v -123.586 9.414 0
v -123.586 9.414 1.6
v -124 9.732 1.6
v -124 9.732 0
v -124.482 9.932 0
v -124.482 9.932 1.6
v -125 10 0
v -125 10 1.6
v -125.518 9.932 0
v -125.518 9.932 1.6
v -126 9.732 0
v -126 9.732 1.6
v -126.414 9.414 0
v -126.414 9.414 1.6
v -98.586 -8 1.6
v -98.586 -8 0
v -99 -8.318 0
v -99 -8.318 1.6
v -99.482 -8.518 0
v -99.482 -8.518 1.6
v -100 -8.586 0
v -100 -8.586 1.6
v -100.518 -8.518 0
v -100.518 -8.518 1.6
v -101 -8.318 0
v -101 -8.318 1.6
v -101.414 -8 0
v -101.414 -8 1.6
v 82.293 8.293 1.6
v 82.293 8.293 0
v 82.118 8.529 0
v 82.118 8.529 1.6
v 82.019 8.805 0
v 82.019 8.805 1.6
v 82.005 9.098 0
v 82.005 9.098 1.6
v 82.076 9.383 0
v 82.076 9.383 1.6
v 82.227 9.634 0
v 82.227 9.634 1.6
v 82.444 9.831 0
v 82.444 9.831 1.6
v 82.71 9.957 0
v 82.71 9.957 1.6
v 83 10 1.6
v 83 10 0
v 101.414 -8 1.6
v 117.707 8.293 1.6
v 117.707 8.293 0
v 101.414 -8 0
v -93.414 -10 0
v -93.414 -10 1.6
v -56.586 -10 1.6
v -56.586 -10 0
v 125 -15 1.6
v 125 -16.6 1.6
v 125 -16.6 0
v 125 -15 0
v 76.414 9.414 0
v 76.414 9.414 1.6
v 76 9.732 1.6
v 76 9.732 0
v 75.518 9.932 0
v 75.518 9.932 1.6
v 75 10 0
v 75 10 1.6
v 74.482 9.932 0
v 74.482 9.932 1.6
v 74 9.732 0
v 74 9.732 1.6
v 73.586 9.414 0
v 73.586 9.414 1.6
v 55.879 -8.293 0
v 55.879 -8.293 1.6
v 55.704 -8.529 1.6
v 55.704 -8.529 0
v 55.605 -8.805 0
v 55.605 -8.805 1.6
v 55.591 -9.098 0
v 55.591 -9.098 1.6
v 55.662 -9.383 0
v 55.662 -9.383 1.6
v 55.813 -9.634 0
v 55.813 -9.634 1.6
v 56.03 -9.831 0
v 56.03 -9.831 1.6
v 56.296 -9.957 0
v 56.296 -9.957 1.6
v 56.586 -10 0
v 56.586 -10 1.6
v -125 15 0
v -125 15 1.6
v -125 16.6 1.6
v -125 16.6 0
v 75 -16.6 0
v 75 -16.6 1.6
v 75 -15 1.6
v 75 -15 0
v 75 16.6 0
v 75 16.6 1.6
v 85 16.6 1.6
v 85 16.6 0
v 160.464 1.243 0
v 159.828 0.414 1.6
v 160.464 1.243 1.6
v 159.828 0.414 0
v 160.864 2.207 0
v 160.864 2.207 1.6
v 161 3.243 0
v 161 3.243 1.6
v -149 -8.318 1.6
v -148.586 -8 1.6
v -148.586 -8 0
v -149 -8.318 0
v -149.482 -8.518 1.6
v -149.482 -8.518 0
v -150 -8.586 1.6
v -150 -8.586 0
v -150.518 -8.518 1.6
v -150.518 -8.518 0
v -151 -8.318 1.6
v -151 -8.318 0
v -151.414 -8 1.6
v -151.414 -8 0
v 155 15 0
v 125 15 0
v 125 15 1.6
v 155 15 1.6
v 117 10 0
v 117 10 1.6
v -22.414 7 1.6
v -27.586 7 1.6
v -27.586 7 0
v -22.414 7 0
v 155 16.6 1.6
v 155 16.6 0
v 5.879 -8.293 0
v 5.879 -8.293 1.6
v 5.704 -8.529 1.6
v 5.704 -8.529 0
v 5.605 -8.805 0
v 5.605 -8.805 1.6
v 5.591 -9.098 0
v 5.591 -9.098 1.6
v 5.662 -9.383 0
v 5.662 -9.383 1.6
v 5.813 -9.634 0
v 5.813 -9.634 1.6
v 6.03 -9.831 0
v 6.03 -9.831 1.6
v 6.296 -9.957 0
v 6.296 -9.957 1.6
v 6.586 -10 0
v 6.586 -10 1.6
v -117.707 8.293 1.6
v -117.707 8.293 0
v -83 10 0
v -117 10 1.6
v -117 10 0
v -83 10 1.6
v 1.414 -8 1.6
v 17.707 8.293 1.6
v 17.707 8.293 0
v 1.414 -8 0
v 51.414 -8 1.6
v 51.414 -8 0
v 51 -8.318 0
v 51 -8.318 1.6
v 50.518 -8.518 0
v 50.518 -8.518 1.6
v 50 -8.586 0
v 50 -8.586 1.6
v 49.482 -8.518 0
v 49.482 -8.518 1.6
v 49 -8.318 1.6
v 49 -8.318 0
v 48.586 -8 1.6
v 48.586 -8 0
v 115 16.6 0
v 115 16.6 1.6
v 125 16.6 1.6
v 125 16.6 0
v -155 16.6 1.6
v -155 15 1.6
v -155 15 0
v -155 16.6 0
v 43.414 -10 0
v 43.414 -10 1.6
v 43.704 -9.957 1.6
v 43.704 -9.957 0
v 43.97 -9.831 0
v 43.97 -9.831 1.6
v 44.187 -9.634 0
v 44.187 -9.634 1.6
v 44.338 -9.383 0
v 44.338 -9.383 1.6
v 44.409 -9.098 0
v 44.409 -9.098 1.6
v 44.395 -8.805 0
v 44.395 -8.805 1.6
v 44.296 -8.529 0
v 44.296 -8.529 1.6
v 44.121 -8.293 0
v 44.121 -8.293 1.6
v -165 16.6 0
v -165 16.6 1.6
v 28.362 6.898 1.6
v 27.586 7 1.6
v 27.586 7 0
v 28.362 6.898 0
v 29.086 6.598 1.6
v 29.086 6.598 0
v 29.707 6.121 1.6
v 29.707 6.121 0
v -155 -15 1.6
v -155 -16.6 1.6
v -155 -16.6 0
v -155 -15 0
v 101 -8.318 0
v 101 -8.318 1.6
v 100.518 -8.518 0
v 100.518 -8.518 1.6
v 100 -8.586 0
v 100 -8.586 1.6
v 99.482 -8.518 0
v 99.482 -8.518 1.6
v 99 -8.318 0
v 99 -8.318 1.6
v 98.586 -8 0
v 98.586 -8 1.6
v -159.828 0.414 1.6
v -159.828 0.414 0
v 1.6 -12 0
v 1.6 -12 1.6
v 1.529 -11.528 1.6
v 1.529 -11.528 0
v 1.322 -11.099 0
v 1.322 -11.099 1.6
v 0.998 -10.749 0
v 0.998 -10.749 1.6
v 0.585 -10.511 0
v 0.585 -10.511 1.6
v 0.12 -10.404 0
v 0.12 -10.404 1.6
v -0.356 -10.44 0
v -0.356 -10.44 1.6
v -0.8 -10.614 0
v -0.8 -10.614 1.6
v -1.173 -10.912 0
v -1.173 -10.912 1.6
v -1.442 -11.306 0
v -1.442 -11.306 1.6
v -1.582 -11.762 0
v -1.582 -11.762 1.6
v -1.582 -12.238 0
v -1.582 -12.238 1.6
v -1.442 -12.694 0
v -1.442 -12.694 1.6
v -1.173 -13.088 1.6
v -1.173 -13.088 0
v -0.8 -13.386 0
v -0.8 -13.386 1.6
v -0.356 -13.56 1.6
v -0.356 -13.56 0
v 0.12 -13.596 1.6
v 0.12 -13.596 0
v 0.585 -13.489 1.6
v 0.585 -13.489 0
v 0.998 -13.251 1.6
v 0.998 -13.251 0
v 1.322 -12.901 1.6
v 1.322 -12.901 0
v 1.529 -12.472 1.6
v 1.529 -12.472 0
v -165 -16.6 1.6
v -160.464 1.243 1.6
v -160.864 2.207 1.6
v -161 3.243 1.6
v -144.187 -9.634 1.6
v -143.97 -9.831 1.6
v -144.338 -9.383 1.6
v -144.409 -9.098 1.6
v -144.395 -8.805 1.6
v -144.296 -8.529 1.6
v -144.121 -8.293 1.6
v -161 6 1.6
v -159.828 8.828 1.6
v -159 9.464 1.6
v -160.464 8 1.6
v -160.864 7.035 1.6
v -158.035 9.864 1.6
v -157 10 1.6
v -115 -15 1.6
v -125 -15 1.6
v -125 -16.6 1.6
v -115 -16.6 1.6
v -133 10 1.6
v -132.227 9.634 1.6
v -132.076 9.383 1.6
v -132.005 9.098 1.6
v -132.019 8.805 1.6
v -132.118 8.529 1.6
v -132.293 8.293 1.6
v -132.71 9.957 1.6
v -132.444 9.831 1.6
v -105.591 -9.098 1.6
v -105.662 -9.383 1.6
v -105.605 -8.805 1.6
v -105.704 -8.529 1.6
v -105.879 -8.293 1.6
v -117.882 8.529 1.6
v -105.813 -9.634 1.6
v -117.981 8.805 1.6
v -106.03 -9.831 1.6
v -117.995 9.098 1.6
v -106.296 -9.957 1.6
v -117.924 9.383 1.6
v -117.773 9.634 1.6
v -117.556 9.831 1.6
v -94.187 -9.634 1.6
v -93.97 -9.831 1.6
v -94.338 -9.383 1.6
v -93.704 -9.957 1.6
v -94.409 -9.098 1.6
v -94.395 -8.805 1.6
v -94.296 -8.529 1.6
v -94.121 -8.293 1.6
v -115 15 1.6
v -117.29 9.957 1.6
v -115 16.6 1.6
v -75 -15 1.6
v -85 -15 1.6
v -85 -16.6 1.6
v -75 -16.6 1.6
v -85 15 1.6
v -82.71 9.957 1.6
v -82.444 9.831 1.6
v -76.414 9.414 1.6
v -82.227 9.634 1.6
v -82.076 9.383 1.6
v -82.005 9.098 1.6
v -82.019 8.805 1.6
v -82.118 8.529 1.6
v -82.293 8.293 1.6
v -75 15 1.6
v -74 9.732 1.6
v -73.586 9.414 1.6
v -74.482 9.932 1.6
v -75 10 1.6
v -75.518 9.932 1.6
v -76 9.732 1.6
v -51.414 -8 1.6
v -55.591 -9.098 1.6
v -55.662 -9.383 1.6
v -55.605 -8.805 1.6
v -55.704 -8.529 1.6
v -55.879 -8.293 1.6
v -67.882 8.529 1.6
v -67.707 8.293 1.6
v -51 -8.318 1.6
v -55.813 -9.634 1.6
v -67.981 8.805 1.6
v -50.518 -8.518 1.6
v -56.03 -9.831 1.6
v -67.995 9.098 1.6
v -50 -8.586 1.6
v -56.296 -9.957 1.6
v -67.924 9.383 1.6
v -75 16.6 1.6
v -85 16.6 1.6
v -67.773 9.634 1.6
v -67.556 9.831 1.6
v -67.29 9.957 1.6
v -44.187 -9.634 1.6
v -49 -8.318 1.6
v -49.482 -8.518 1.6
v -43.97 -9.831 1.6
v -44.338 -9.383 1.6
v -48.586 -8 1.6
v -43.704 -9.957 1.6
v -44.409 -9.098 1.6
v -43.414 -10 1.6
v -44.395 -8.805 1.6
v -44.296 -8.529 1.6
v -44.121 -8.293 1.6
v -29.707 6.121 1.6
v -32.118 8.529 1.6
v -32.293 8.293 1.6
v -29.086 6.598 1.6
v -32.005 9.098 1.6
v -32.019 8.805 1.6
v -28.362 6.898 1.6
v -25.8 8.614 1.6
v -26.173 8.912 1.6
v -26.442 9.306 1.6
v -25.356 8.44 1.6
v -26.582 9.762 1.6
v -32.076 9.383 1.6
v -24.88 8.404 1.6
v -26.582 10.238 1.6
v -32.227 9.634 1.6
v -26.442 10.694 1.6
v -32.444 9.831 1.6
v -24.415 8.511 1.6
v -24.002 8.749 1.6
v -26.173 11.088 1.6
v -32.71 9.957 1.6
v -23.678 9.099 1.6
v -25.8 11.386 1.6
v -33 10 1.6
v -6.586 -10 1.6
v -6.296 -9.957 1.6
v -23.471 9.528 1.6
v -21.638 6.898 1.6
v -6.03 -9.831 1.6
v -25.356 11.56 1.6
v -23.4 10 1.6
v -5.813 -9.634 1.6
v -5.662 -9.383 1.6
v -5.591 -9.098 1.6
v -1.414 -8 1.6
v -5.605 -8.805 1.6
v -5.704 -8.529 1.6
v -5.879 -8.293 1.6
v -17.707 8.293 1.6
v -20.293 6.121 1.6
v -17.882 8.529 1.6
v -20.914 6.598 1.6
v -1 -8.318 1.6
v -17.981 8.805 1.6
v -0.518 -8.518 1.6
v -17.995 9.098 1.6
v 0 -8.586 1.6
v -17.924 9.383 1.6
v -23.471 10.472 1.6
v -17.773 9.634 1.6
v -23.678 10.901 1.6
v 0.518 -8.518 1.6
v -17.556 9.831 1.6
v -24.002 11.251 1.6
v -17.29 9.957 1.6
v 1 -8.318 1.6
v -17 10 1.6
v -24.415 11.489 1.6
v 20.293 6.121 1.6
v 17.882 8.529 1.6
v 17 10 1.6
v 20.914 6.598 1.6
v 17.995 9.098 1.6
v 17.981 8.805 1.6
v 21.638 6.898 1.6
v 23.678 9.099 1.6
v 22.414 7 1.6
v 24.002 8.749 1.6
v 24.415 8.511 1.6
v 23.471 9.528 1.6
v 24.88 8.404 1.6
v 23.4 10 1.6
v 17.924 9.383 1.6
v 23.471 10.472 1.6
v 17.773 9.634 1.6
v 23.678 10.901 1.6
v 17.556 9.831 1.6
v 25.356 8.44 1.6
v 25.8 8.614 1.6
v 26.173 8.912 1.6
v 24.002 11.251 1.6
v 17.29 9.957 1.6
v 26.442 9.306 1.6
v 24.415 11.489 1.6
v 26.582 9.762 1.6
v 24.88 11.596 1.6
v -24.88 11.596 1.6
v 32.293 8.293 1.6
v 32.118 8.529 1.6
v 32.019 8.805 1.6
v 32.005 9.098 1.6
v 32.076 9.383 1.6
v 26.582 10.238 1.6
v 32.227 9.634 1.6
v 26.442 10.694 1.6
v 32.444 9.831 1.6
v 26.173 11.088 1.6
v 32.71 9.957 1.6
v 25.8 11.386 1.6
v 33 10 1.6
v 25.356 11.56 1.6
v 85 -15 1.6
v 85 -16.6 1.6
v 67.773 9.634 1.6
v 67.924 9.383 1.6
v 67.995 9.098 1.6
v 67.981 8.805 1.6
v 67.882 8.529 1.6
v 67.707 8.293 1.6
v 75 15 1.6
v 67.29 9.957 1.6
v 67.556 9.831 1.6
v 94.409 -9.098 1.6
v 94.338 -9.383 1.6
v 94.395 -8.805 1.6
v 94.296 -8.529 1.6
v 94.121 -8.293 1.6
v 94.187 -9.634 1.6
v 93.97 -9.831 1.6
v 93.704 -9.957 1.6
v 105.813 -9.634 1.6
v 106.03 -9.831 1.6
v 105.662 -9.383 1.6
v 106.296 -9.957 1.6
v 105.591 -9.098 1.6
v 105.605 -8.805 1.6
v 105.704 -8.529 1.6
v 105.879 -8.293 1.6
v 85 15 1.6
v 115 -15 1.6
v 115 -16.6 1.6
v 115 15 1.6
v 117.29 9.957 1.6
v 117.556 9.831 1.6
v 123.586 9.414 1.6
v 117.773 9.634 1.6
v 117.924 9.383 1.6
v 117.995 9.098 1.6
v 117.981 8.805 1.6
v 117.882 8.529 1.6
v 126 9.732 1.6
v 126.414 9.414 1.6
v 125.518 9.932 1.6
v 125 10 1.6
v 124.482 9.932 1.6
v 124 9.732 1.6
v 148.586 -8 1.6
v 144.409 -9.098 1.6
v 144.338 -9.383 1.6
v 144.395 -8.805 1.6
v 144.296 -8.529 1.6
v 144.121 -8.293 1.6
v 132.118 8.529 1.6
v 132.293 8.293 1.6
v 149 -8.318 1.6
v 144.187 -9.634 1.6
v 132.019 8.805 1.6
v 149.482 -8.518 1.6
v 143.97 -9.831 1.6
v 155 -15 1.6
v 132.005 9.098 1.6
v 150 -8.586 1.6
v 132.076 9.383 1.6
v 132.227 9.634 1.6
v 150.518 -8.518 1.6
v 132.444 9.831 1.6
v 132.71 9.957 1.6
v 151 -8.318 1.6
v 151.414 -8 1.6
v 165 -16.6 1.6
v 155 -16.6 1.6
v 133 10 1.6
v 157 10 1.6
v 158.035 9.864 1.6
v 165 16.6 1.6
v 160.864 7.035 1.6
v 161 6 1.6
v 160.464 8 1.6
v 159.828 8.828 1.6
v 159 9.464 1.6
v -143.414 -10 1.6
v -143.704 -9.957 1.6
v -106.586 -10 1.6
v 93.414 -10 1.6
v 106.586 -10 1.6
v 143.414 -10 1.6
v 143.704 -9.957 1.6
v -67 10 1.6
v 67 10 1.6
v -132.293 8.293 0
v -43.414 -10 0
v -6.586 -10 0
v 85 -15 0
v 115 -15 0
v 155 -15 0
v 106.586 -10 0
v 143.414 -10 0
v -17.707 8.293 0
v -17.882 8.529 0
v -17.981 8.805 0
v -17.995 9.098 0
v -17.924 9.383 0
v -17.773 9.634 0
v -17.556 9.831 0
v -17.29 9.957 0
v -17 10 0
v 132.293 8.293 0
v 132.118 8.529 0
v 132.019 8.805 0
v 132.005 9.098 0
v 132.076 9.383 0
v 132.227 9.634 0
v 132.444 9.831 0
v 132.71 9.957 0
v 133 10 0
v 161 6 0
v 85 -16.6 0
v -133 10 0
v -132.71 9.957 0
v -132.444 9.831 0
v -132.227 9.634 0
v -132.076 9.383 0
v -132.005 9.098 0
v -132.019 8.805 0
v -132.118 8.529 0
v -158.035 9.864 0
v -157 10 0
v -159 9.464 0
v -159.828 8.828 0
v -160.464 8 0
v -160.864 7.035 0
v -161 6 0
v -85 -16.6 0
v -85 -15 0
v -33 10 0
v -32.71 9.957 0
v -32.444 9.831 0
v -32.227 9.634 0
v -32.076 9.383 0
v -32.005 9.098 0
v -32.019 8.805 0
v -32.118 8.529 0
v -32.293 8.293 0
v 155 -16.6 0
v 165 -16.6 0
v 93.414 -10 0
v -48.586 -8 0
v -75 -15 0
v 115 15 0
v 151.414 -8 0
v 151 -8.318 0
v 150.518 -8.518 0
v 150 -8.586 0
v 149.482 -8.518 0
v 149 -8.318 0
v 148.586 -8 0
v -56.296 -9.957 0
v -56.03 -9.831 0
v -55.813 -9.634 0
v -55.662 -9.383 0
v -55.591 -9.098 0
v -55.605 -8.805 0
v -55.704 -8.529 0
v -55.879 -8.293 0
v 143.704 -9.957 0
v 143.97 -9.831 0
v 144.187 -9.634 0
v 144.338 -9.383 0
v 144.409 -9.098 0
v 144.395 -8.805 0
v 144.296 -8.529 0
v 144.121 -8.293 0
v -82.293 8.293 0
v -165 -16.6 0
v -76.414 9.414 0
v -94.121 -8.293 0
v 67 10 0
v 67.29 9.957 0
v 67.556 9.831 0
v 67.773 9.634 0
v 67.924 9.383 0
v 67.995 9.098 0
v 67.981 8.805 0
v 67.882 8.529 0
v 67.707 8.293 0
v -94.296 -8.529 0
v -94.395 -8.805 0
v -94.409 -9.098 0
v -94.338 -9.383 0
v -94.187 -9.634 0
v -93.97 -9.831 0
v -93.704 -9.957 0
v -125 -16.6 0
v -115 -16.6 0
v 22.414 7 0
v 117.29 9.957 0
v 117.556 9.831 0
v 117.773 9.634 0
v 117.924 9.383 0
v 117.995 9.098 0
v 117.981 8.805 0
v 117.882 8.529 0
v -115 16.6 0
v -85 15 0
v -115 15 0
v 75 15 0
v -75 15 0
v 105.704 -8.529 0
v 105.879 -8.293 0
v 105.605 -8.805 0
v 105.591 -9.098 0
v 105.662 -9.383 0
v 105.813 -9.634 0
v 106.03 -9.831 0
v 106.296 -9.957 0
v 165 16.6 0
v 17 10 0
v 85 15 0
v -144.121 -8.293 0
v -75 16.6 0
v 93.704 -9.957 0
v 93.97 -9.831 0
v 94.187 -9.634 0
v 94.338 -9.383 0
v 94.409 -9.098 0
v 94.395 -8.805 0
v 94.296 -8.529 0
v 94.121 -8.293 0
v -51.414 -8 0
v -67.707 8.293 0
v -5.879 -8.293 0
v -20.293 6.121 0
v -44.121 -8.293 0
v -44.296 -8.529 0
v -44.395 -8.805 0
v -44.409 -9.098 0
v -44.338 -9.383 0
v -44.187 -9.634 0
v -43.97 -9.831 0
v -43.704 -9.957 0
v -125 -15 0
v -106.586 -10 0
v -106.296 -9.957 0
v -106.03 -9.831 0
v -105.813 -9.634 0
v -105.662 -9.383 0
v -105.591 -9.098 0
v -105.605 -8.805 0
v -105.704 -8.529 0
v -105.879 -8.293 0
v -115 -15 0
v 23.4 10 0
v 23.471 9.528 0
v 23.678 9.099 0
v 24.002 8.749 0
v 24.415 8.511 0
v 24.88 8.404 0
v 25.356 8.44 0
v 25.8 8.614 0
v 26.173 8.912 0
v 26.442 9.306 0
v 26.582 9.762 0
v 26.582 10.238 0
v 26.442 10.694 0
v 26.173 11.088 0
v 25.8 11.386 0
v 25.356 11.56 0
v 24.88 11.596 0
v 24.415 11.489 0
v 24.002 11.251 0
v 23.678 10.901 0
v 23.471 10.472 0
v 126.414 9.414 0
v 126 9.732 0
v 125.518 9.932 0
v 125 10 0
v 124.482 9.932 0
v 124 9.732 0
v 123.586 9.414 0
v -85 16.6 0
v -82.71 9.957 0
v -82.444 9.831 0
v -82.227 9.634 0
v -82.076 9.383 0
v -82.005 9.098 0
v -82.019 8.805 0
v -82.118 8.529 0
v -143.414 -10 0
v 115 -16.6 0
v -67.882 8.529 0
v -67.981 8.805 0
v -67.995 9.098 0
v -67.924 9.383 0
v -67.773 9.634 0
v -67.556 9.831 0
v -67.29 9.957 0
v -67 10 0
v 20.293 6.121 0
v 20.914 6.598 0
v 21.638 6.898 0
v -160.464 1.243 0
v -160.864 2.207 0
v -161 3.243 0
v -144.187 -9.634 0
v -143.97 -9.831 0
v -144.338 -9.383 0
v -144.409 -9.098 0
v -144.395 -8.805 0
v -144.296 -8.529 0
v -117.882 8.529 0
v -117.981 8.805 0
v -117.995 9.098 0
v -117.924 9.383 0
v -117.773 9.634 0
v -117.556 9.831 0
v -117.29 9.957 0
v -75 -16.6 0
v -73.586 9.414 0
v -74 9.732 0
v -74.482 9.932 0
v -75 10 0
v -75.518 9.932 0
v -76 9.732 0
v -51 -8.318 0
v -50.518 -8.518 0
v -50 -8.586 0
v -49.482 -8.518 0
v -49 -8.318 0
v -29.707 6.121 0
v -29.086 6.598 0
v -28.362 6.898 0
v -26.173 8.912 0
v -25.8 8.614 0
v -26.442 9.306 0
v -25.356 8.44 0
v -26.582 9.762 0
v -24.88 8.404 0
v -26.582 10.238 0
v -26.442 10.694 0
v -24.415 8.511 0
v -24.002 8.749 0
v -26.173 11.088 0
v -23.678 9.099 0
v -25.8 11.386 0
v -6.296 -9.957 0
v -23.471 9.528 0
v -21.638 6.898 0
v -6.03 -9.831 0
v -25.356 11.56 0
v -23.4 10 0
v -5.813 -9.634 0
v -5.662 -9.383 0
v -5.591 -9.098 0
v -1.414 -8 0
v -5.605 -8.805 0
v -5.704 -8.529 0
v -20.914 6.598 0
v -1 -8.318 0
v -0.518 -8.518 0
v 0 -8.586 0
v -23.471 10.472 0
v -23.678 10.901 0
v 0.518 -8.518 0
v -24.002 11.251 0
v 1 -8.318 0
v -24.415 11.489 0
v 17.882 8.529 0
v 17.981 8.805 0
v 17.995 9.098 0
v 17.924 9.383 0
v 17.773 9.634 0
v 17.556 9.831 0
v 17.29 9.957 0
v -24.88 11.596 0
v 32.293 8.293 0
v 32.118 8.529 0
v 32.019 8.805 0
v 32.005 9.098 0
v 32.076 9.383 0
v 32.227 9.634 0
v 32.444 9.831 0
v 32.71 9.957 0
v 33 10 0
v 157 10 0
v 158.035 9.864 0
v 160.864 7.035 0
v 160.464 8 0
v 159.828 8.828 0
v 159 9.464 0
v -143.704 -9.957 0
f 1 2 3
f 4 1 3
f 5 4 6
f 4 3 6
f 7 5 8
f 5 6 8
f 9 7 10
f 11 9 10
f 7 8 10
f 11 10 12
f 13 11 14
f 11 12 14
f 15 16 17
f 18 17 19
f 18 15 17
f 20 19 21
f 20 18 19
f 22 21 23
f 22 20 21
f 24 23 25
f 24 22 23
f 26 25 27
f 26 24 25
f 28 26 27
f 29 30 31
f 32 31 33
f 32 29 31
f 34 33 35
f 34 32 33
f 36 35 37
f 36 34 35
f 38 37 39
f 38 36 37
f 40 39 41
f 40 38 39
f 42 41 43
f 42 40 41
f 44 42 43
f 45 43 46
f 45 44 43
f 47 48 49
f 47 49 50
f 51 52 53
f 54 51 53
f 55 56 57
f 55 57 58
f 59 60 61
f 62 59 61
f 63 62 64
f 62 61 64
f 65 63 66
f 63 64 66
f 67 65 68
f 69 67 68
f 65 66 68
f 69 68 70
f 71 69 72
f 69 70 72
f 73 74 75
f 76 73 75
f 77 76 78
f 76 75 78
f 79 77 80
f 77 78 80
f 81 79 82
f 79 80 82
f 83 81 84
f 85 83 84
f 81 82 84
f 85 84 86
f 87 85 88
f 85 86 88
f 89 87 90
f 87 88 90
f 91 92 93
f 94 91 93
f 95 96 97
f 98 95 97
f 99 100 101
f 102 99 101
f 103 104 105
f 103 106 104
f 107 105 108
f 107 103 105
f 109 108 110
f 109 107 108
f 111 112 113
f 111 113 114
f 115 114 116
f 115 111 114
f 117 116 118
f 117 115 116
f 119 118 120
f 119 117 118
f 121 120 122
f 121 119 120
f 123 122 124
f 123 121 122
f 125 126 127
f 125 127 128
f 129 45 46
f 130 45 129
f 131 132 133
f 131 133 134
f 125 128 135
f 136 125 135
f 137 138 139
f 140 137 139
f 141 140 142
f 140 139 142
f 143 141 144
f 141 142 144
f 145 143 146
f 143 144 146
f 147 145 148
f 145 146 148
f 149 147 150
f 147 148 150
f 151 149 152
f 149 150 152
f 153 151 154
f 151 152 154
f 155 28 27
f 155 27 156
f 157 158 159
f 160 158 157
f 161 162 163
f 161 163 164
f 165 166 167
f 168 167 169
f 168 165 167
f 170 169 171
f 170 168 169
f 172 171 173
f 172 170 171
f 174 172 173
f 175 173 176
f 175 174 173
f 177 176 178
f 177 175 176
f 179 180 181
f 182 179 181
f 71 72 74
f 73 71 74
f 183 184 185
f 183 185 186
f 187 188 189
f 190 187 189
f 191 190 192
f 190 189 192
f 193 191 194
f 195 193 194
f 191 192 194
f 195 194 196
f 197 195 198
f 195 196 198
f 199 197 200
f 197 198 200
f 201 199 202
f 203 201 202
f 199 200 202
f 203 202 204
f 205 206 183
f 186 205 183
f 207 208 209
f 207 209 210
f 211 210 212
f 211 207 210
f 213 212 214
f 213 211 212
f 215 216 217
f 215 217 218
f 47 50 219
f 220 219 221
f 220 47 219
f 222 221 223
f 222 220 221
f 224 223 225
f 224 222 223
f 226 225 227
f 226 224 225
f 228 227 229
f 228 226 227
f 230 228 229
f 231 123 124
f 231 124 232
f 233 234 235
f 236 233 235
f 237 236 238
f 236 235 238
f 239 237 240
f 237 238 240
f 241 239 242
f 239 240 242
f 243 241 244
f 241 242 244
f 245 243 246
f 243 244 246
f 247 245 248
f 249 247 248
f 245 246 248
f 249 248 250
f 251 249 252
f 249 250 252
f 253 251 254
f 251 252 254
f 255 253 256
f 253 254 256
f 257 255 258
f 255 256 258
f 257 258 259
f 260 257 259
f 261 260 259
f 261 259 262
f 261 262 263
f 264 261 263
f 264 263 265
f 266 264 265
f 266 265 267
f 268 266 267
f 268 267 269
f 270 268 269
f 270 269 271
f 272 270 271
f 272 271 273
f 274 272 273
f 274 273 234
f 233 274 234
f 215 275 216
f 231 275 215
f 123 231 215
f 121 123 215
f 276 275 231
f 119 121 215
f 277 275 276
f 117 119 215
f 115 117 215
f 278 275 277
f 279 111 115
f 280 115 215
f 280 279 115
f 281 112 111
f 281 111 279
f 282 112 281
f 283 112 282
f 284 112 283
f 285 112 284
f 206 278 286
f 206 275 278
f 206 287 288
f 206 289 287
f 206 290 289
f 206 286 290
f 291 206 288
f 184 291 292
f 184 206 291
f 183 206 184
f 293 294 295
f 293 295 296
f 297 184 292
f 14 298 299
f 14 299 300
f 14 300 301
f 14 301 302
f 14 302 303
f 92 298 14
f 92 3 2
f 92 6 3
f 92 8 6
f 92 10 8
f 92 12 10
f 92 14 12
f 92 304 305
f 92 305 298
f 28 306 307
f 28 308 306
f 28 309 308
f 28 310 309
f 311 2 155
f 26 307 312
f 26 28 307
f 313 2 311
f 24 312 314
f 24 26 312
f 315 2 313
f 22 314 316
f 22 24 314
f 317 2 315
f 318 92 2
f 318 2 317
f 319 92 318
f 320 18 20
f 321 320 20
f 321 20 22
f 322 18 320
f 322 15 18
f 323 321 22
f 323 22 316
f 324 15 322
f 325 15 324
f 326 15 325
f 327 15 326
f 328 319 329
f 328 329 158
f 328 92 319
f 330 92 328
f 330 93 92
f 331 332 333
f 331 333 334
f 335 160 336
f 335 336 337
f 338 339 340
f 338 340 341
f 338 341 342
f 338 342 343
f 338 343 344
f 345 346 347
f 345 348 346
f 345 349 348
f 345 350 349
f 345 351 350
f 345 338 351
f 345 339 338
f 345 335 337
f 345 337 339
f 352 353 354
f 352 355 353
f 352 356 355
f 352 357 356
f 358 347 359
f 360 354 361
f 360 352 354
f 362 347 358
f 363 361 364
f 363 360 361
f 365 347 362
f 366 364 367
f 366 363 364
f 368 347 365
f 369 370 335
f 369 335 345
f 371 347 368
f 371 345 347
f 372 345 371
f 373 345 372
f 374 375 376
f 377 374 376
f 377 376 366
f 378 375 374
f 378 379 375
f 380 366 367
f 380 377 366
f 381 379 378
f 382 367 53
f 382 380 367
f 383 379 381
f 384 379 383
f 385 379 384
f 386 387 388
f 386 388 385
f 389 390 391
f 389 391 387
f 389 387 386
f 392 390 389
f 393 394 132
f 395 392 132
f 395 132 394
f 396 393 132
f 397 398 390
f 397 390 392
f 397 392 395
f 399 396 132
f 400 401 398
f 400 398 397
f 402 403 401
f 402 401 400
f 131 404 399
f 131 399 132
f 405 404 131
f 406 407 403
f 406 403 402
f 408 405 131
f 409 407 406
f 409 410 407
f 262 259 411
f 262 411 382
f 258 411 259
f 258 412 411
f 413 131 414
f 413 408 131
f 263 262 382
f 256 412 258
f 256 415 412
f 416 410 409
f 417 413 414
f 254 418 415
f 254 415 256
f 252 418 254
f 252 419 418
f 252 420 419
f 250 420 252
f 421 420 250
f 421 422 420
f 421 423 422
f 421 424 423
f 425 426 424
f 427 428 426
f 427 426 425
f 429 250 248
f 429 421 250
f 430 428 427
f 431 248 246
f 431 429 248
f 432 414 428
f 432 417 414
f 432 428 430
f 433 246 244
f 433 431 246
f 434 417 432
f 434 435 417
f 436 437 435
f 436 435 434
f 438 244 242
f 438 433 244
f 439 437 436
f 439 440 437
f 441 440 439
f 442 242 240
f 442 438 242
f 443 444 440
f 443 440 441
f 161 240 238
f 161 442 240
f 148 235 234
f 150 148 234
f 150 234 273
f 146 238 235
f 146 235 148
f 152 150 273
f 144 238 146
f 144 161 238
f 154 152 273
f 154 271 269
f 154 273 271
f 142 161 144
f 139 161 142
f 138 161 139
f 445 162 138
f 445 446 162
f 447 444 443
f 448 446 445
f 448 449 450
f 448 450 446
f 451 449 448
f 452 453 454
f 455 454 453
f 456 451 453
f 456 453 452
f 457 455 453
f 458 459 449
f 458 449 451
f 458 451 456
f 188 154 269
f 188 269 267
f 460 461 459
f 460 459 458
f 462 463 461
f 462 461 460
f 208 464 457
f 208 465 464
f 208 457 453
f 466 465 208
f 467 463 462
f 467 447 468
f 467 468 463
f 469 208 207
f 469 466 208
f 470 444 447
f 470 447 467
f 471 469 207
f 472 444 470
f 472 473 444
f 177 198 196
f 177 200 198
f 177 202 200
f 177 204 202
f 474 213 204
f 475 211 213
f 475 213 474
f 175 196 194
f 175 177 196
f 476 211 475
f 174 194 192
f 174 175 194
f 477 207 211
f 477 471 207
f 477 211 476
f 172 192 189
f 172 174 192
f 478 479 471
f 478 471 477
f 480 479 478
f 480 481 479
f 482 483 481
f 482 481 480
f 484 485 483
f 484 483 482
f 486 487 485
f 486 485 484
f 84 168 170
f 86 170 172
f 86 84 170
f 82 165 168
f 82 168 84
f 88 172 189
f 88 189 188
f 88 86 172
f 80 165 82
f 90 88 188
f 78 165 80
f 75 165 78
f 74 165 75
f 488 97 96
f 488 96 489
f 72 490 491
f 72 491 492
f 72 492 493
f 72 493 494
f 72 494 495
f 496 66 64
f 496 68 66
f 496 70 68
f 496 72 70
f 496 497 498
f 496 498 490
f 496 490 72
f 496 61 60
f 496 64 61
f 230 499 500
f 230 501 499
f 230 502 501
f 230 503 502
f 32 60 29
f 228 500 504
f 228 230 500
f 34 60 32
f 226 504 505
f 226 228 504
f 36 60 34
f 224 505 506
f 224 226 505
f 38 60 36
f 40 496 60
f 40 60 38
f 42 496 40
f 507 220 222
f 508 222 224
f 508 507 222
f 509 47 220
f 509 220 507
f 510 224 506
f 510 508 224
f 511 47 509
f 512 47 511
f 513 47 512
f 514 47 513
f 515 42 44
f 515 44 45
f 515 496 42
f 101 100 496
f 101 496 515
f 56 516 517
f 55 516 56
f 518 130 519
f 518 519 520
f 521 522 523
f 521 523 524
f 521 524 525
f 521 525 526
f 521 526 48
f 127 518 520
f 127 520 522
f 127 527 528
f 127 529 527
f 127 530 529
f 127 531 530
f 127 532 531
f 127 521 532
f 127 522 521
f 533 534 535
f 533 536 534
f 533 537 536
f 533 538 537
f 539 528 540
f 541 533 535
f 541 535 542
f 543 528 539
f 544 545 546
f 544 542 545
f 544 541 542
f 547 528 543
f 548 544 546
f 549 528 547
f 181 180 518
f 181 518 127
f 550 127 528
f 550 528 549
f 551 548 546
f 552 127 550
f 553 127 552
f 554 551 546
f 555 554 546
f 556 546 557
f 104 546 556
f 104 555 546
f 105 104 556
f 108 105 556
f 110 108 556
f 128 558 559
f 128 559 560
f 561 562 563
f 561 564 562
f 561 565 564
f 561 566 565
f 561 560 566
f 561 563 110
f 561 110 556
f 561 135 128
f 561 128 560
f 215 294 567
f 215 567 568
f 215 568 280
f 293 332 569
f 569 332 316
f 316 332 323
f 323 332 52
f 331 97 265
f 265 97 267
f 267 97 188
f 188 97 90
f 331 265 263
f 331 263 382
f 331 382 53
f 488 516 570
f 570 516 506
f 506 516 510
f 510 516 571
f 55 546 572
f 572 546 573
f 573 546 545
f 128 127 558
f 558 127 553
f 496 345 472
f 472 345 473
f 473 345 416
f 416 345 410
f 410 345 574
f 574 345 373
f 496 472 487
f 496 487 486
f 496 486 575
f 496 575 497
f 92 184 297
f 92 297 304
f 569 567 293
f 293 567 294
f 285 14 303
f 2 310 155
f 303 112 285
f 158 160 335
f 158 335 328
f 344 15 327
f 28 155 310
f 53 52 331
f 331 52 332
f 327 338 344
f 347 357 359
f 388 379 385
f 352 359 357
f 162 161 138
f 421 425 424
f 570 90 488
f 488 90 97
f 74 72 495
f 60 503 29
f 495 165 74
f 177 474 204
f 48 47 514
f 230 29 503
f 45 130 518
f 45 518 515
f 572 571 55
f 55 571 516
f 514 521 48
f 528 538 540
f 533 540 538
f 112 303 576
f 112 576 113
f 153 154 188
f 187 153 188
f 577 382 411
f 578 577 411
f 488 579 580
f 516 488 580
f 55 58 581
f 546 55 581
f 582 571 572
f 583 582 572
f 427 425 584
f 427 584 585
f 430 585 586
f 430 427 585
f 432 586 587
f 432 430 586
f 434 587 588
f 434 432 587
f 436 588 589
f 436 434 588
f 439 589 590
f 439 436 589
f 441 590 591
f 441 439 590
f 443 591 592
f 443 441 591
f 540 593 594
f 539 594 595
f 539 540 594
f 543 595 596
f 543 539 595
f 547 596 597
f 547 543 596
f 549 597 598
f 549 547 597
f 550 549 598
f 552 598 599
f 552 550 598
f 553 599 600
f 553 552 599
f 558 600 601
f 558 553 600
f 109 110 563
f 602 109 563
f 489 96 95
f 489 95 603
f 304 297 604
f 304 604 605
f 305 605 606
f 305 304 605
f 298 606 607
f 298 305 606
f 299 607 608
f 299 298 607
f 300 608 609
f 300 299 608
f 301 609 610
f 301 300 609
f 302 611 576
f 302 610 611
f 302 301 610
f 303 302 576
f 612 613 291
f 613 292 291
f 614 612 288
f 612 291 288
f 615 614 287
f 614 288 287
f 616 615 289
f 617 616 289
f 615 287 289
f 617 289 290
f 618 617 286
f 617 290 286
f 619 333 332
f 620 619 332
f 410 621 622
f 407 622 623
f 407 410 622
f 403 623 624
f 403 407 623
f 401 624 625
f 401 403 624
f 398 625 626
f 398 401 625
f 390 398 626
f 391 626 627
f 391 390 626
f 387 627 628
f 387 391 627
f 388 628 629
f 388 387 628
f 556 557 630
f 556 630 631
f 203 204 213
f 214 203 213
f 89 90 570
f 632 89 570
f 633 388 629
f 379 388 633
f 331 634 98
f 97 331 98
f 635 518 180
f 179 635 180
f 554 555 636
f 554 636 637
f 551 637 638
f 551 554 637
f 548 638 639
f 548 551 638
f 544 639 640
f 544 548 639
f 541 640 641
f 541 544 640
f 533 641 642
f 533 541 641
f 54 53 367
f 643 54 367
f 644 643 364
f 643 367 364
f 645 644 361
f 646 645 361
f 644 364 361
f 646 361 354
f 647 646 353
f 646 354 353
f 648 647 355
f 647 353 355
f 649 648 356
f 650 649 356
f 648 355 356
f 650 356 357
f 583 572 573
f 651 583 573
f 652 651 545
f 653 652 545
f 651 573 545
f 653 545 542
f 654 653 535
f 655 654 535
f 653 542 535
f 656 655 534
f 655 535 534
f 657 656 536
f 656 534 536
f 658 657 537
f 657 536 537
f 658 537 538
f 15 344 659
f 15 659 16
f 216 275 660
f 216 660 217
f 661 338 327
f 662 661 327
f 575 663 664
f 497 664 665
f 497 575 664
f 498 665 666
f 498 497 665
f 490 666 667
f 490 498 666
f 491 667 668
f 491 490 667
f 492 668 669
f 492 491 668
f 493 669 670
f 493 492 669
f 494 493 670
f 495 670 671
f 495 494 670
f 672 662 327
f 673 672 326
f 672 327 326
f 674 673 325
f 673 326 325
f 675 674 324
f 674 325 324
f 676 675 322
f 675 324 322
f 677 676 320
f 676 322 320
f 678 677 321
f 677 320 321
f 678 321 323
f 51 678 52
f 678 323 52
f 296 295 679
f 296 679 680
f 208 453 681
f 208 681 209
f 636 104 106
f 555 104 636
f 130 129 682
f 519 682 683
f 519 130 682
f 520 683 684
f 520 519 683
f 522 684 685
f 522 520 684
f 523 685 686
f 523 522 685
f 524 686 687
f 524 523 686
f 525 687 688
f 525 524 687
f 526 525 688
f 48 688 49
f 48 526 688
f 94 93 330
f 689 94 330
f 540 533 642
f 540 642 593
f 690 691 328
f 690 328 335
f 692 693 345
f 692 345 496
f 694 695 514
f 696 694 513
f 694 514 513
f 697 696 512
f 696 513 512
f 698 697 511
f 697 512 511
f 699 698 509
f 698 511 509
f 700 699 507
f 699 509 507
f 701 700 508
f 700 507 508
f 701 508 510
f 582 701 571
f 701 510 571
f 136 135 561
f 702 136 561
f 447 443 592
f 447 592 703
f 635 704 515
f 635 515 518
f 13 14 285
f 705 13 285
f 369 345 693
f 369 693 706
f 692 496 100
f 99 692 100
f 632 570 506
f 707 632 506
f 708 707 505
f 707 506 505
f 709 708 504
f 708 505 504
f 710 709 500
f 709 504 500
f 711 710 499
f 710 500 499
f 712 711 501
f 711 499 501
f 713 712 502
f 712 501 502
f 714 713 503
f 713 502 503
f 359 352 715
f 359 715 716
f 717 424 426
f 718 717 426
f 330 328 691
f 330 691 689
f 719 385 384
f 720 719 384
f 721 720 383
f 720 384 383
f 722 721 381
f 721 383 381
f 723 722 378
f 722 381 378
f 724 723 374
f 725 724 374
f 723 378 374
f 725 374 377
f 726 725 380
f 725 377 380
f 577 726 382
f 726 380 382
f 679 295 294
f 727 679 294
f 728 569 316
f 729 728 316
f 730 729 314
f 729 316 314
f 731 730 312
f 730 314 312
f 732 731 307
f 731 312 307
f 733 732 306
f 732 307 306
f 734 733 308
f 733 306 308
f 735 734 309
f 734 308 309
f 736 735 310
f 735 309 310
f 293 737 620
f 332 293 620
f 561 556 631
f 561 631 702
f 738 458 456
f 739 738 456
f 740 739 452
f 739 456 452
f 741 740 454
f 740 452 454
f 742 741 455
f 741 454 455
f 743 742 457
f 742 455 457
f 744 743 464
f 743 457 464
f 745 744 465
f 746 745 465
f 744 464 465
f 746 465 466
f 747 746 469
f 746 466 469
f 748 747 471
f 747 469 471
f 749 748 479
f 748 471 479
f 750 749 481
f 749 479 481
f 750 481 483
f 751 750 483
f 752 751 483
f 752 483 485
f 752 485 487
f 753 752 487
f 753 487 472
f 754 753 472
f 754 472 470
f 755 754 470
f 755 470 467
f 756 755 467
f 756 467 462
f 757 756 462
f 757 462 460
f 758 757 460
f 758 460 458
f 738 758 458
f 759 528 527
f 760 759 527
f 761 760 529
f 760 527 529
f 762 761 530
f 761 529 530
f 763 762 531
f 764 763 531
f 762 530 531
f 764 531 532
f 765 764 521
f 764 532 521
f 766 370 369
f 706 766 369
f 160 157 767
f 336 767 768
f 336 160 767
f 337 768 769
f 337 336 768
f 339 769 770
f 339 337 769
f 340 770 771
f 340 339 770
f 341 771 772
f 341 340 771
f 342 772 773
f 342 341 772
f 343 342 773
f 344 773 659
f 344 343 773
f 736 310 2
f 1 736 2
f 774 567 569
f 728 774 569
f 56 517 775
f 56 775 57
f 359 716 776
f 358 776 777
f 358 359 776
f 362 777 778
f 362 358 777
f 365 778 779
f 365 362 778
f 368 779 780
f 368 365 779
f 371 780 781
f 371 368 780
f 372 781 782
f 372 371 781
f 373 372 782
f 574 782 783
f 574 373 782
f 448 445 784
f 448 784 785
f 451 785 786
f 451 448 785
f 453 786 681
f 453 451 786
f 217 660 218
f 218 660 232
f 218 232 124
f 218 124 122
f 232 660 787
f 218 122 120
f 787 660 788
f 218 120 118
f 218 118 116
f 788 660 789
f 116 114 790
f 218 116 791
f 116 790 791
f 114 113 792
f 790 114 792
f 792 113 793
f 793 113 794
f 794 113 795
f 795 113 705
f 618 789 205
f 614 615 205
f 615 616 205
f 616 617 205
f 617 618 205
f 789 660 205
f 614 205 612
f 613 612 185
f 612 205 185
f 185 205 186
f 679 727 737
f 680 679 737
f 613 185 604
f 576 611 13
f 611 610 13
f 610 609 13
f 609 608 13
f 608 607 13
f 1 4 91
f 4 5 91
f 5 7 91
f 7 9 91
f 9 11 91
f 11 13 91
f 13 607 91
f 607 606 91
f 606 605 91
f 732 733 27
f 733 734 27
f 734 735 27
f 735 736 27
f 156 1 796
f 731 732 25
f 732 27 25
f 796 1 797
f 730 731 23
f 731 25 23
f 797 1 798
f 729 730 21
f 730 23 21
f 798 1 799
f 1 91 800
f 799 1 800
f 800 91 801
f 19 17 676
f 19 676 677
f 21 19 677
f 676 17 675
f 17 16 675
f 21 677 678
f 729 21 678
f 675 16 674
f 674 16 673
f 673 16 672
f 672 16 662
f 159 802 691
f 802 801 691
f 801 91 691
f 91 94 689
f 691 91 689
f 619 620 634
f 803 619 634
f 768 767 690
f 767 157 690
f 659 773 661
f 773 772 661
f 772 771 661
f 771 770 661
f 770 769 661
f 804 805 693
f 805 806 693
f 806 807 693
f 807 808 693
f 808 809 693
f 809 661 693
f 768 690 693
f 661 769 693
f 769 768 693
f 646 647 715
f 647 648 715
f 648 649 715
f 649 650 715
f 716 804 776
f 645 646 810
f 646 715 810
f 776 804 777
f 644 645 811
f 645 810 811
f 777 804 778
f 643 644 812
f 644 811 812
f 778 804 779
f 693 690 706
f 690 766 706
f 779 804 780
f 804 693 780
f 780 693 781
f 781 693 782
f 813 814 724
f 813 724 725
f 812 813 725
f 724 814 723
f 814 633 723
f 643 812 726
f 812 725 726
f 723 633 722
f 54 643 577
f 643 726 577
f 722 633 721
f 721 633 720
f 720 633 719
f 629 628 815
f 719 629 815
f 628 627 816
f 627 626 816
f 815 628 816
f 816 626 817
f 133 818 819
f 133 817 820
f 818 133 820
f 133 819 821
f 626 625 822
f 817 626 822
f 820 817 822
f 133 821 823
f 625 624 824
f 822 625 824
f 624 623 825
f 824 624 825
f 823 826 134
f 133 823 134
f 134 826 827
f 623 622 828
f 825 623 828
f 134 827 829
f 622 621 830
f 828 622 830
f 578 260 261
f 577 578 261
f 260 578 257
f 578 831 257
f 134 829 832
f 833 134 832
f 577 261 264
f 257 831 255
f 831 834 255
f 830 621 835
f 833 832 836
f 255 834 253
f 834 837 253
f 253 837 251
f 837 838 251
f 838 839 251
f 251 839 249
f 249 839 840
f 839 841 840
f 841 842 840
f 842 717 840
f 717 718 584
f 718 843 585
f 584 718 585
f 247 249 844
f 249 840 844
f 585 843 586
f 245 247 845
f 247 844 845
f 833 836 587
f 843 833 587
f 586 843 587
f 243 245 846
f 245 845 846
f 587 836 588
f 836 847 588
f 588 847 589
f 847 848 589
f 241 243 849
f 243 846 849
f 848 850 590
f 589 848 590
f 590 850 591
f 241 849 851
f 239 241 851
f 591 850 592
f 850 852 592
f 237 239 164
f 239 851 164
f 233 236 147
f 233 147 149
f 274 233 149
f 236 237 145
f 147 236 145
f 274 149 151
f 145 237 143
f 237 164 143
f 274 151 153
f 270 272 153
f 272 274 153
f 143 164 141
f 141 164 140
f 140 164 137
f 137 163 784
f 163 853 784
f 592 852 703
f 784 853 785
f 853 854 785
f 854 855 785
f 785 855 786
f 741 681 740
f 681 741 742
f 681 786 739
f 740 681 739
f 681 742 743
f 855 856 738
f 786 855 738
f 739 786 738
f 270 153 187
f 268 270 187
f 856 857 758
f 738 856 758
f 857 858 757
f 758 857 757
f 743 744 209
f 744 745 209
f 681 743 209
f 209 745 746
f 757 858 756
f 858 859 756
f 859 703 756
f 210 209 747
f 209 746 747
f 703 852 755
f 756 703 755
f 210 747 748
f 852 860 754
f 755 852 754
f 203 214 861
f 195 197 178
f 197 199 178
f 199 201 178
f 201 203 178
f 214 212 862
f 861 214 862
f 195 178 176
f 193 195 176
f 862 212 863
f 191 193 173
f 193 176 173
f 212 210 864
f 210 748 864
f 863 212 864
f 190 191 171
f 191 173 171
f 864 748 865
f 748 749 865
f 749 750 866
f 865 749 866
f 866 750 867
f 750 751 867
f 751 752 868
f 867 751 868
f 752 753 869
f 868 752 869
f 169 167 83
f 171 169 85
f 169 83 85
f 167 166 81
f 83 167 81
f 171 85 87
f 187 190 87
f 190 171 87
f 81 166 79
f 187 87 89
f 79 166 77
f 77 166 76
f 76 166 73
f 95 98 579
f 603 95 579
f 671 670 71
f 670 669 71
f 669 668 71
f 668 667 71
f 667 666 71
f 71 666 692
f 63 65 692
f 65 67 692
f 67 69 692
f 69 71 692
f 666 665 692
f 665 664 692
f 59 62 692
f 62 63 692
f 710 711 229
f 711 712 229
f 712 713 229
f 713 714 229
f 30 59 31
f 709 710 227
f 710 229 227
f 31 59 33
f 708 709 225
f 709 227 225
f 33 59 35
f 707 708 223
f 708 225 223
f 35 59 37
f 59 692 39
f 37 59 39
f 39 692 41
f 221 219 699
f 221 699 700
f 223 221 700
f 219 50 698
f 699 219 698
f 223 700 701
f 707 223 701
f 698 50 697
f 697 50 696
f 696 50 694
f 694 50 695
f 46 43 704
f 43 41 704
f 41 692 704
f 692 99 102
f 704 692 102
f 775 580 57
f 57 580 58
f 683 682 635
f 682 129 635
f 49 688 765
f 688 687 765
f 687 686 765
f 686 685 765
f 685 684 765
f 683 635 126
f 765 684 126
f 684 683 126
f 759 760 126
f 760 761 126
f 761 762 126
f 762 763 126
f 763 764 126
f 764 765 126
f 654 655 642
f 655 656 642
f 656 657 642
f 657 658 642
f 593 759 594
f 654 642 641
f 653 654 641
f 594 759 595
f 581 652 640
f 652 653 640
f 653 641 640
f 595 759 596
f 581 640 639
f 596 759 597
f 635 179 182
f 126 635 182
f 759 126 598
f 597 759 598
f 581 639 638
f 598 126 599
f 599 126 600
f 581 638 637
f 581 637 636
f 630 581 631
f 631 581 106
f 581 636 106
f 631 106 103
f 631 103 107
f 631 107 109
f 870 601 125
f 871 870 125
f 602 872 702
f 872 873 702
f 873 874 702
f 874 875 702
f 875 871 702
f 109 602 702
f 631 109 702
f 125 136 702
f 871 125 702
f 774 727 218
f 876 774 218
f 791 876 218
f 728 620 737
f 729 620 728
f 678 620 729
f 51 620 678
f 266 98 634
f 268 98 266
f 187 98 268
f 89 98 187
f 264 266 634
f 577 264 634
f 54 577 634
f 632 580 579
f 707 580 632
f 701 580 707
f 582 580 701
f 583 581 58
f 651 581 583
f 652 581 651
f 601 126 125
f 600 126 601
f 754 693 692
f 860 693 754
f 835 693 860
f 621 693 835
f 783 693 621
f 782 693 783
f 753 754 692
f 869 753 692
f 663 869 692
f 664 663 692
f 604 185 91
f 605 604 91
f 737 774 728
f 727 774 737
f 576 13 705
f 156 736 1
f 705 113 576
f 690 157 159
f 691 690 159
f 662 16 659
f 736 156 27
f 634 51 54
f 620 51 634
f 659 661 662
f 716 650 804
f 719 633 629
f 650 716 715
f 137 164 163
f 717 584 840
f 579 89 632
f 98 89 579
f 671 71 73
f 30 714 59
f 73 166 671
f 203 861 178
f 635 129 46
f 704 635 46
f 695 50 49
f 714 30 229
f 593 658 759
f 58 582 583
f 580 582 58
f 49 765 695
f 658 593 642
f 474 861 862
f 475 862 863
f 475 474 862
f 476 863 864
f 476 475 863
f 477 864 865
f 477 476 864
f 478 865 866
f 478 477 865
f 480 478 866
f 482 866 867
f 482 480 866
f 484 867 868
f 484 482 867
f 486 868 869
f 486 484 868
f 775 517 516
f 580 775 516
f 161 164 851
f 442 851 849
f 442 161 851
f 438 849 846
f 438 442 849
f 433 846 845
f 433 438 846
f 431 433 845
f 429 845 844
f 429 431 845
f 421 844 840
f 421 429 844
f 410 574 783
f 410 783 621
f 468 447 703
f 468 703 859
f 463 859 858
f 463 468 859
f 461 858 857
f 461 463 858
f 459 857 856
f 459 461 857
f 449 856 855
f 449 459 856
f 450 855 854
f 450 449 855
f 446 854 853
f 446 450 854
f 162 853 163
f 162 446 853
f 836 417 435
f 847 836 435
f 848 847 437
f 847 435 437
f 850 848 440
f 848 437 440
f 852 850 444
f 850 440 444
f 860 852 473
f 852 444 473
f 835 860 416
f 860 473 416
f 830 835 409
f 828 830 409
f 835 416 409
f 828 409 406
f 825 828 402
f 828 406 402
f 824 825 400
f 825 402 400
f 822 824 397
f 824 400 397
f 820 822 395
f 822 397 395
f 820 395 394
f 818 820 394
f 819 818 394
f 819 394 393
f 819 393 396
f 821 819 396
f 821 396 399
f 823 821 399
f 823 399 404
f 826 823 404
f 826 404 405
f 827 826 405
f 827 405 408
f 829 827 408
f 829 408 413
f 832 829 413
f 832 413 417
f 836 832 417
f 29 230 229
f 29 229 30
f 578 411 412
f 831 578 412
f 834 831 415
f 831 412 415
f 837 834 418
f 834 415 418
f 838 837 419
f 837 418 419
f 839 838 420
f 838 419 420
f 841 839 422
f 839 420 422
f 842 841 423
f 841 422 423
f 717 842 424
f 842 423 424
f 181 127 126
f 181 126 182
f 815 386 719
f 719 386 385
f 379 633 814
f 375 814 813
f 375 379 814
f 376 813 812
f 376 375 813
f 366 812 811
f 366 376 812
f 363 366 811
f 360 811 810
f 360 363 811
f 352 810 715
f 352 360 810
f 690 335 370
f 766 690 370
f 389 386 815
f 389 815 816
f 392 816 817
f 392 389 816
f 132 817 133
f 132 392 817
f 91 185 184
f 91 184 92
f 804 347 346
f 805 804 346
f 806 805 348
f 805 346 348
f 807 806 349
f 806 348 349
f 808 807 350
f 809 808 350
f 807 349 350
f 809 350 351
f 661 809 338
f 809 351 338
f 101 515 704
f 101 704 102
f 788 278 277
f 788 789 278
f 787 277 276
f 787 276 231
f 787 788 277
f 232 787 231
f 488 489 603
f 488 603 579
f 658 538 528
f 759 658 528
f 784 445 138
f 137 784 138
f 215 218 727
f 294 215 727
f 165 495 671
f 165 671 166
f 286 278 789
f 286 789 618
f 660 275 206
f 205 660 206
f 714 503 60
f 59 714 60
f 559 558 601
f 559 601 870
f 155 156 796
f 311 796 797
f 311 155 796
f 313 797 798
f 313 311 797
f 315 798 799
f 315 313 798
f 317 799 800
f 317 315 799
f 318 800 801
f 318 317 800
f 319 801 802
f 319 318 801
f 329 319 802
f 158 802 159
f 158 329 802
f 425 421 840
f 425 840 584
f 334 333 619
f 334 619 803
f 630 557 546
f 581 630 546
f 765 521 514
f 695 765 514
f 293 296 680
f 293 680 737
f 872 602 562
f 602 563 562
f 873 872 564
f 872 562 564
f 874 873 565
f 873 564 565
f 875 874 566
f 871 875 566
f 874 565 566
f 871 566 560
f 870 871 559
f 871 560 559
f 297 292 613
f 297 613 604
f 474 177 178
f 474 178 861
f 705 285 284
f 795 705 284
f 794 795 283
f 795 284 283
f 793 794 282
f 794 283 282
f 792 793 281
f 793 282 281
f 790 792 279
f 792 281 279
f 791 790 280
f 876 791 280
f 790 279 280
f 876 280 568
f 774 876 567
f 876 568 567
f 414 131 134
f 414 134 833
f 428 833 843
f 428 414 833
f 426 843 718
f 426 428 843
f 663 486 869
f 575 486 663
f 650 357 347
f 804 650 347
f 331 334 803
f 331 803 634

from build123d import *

# Parameters (mm, degrees)
SKETCH1_W           = 360
SKETCH1_H           = 30
BOSS_EXTRUDE1_DEPTH = 1.6
SKETCH2_W           = 10
SKETCH2_H           = 1.6
BOSS_EXTRUDE2_DEPTH = 1.6
CUT_EXTRUDE1_DEPTH  = 181.770904739
CUT_EXTRUDE2_DEPTH  = 181.770904739
SKETCH5_W           = 15
SKETCH5_H           = 30
CUT_EXTRUDE3_DEPTH  = 181.770904739
SKETCH6_W           = 4
SKETCH6_H           = 33.2
BOSS_EXTRUDE3_DEPTH = 1.6
FILLET1_R           = 4
BOSS_EXTRUDE4_DEPTH = 1.6
SKETCH8_R           = 1.6
CUT_EXTRUDE4_DEPTH  = 166.840646405


with BuildPart() as part:
    # Sketch1 → Boss-Extrude1 (new body)
    with BuildSketch(Plane.XY):
        Rectangle(SKETCH1_W, SKETCH1_H)
    extrude(amount=BOSS_EXTRUDE1_DEPTH)

    # Sketch2 → Boss-Extrude2 (add)
    with BuildSketch(Plane.XY.offset(1.6)):
        with Locations((120, 15.8)):
            Rectangle(SKETCH2_W, SKETCH2_H)
        with Locations((80, 15.8)):
            Rectangle(SKETCH2_W, SKETCH2_H)
        with Locations((160, 15.8)):
            Rectangle(SKETCH2_W, SKETCH2_H)
        with Locations((-160, 15.8)):
            Rectangle(SKETCH2_W, SKETCH2_H)
        with Locations((-120, 15.8)):
            Rectangle(SKETCH2_W, SKETCH2_H)
        with Locations((-80, 15.8)):
            Rectangle(SKETCH2_W, SKETCH2_H)
        with Locations((-120, -15.8)):
            Rectangle(SKETCH2_W, SKETCH2_H)
        with Locations((-80, -15.8)):
            Rectangle(SKETCH2_W, SKETCH2_H)
        with Locations((-160, -15.8)):
            Rectangle(SKETCH2_W, SKETCH2_H)
        with Locations((160, -15.8)):
            Rectangle(SKETCH2_W, SKETCH2_H)
        with Locations((120, -15.8)):
            Rectangle(SKETCH2_W, SKETCH2_H)
        with Locations((80, -15.8)):
            Rectangle(SKETCH2_W, SKETCH2_H)
    extrude(amount=-BOSS_EXTRUDE2_DEPTH)

    # Sketch3 → Cut-Extrude1 (cut, through all)
    with BuildSketch(Plane.XY.offset(1.6)):
        with BuildLine():
            Line((-167, 10), (-133, 10))
            ThreePointArc((-133, 10), (-132.076120467, 9.382683432), (-132.292893219, 8.292893219))
            Line((-132.292893219, 8.292893219), (-148.585786438, -8))
            ThreePointArc((-148.585786438, -8), (-150, -8.585786438), (-151.414213562, -8))
            Line((-151.414213562, -8), (-167.707106781, 8.292893219))
            ThreePointArc((-167.707106781, 8.292893219), (-167.923879533, 9.382683432), (-167, 10))
        make_face()
        with BuildLine():
            Line((-117, 10), (-83, 10))
            ThreePointArc((-83, 10), (-82.076120467, 9.382683432), (-82.292893219, 8.292893219))
            Line((-82.292893219, 8.292893219), (-98.585786438, -8))
            ThreePointArc((-98.585786438, -8), (-100, -8.585786438), (-101.414213562, -8))
            Line((-101.414213562, -8), (-117.707106781, 8.292893219))
            ThreePointArc((-117.707106781, 8.292893219), (-117.923879533, 9.382683432), (-117, 10))
        make_face()
        with BuildLine():
            Line((-67, 10), (-33, 10))
            ThreePointArc((-33, 10), (-32.076120467, 9.382683432), (-32.292893219, 8.292893219))
            Line((-32.292893219, 8.292893219), (-48.585786438, -8))
            ThreePointArc((-48.585786438, -8), (-50, -8.585786438), (-51.414213562, -8))
            Line((-51.414213562, -8), (-67.707106781, 8.292893219))
            ThreePointArc((-67.707106781, 8.292893219), (-67.923879533, 9.382683432), (-67, 10))
        make_face()
        with BuildLine():
            Line((-17, 10), (17, 10))
            ThreePointArc((17, 10), (17.923879533, 9.382683432), (17.707106781, 8.292893219))
            Line((17.707106781, 8.292893219), (1.414213562, -8))
            ThreePointArc((1.414213562, -8), (0, -8.585786438), (-1.414213562, -8))
            Line((-1.414213562, -8), (-17.707106781, 8.292893219))
            ThreePointArc((-17.707106781, 8.292893219), (-17.923879533, 9.382683432), (-17, 10))
        make_face()
        with BuildLine():
            Line((33, 10), (67, 10))
            ThreePointArc((67, 10), (67.923879533, 9.382683432), (67.707106781, 8.292893219))
            Line((67.707106781, 8.292893219), (51.414213562, -8))
            ThreePointArc((51.414213562, -8), (50, -8.585786438), (48.585786438, -8))
            Line((48.585786438, -8), (32.292893219, 8.292893219))
            ThreePointArc((32.292893219, 8.292893219), (32.076120467, 9.382683432), (33, 10))
        make_face()
        with BuildLine():
            Line((83, 10), (117, 10))
            ThreePointArc((117, 10), (117.923879533, 9.382683432), (117.707106781, 8.292893219))
            Line((117.707106781, 8.292893219), (101.414213562, -8))
            ThreePointArc((101.414213562, -8), (100, -8.585786438), (98.585786438, -8))
            Line((98.585786438, -8), (82.292893219, 8.292893219))
            ThreePointArc((82.292893219, 8.292893219), (82.076120467, 9.382683432), (83, 10))
        make_face()
        with BuildLine():
            Line((133, 10), (167, 10))
            ThreePointArc((167, 10), (167.923879533, 9.382683432), (167.707106781, 8.292893219))
            Line((167.707106781, 8.292893219), (151.414213562, -8))
            ThreePointArc((151.414213562, -8), (150, -8.585786438), (148.585786438, -8))
            Line((148.585786438, -8), (132.292893219, 8.292893219))
            ThreePointArc((132.292893219, 8.292893219), (132.076120467, 9.382683432), (133, 10))
        make_face()
    extrude(amount=-CUT_EXTRUDE1_DEPTH, mode=Mode.SUBTRACT)

    # Sketch4 → Cut-Extrude2 (cut, through all)
    with BuildSketch(Plane.XY.offset(1.6)):
        with BuildLine():
            Line((-143.414213562, -10), (-106.585786438, -10))
            ThreePointArc((-106.585786438, -10), (-105.661906905, -9.382683432), (-105.878679656, -8.292893219))
            Line((-105.878679656, -8.292893219), (-123.585786438, 9.414213562))
            ThreePointArc((-123.585786438, 9.414213562), (-125, 10), (-126.414213562, 9.414213562))
            Line((-126.414213562, 9.414213562), (-144.121320344, -8.292893219))
            ThreePointArc((-144.121320344, -8.292893219), (-144.338093095, -9.382683432), (-143.414213562, -10))
        make_face()
        with BuildLine():
            Line((-93.414213562, -10), (-56.585786438, -10))
            ThreePointArc((-56.585786438, -10), (-55.661906905, -9.382683432), (-55.878679656, -8.292893219))
            Line((-55.878679656, -8.292893219), (-73.585786438, 9.414213562))
            ThreePointArc((-73.585786438, 9.414213562), (-75, 10), (-76.414213562, 9.414213562))
            Line((-76.414213562, 9.414213562), (-94.121320344, -8.292893219))
            ThreePointArc((-94.121320344, -8.292893219), (-94.338093095, -9.382683432), (-93.414213562, -10))
        make_face()
        with BuildLine():
            Line((-43.414213562, -10), (-6.585786438, -10))
            ThreePointArc((-6.585786438, -10), (-5.661906905, -9.382683432), (-5.878679656, -8.292893219))
            Line((-5.878679656, -8.292893219), (-23.585786438, 9.414213562))
            ThreePointArc((-23.585786438, 9.414213562), (-25, 10), (-26.414213562, 9.414213562))
            Line((-26.414213562, 9.414213562), (-44.121320344, -8.292893219))
            ThreePointArc((-44.121320344, -8.292893219), (-44.338093095, -9.382683432), (-43.414213562, -10))
        make_face()
        with BuildLine():
            Line((6.585786438, -10), (43.414213562, -10))
            ThreePointArc((43.414213562, -10), (44.338093095, -9.382683432), (44.121320344, -8.292893219))
            Line((44.121320344, -8.292893219), (26.414213562, 9.414213562))
            ThreePointArc((26.414213562, 9.414213562), (25, 10), (23.585786438, 9.414213562))
            Line((23.585786438, 9.414213562), (5.878679656, -8.292893219))
            ThreePointArc((5.878679656, -8.292893219), (5.661906905, -9.382683432), (6.585786438, -10))
        make_face()
        with BuildLine():
            Line((56.585786438, -10), (93.414213562, -10))
            ThreePointArc((93.414213562, -10), (94.338093095, -9.382683432), (94.121320344, -8.292893219))
            Line((94.121320344, -8.292893219), (76.414213562, 9.414213562))
            ThreePointArc((76.414213562, 9.414213562), (75, 10), (73.585786438, 9.414213562))
            Line((73.585786438, 9.414213562), (55.878679656, -8.292893219))
            ThreePointArc((55.878679656, -8.292893219), (55.661906905, -9.382683432), (56.585786438, -10))
        make_face()
        with BuildLine():
            Line((106.585786438, -10), (143.414213562, -10))
            ThreePointArc((143.414213562, -10), (144.338093095, -9.382683432), (144.121320344, -8.292893219))
            Line((144.121320344, -8.292893219), (126.414213562, 9.414213562))
            ThreePointArc((126.414213562, 9.414213562), (125, 10), (123.585786438, 9.414213562))
            Line((123.585786438, 9.414213562), (105.878679656, -8.292893219))
            ThreePointArc((105.878679656, -8.292893219), (105.661906905, -9.382683432), (106.585786438, -10))
        make_face()
    extrude(amount=-CUT_EXTRUDE2_DEPTH, mode=Mode.SUBTRACT)

    # Sketch5 → Cut-Extrude3 (cut, through all)
    with BuildSketch(Plane.XY.offset(1.6)):
        with Locations((-172.5, 0)):
            Rectangle(SKETCH5_W, SKETCH5_H)
        with Locations((172.5, 0)):
            Rectangle(SKETCH5_W, SKETCH5_H)
    extrude(amount=-CUT_EXTRUDE3_DEPTH, mode=Mode.SUBTRACT)

    # Sketch6 → Boss-Extrude3 (add)
    with BuildSketch(Plane.XY.offset(1.6)):
        with Locations((-163, 0)):
            Rectangle(SKETCH6_W, SKETCH6_H)
        with Locations((163, 0)):
            Rectangle(SKETCH6_W, SKETCH6_H)
    extrude(amount=-BOSS_EXTRUDE3_DEPTH)

    # Fillet1
    fillet1_edges = [part.edges().sort_by_distance(p)[0] for p in [
        (-161, 10, 0.8),
        (-161, 1.585786438, 0.8),
        (161, 1.585786438, 0.8),
        (161, 10, 0.8),
    ]]
    fillet(fillet1_edges, radius=FILLET1_R)

    # Sketch7 → Boss-Extrude4 (add)
    with BuildSketch(Plane.XY.offset(1.6)):
        with BuildLine():
            Line((-26.414213562, 9.414213562), (-29.707106781, 6.121320344))
            ThreePointArc((-29.707106781, 6.121320344), (-28.733836735, 6.771638598), (-27.585786438, 7))
            Line((-27.585786438, 7), (-22.414213562, 7))
            ThreePointArc((-22.414213562, 7), (-21.266163265, 6.771638598), (-20.292893219, 6.121320344))
            Line((-20.292893219, 6.121320344), (-23.585786438, 9.414213562))
            ThreePointArc((-23.585786438, 9.414213562), (-25, 10), (-26.414213562, 9.414213562))
        make_face()
        with BuildLine():
            Line((23.585786438, 9.414213562), (20.292893219, 6.121320344))
            ThreePointArc((20.292893219, 6.121320344), (21.266163265, 6.771638598), (22.414213562, 7))
            Line((22.414213562, 7), (27.585786438, 7))
            ThreePointArc((27.585786438, 7), (28.733836735, 6.771638598), (29.707106781, 6.121320344))
            Line((29.707106781, 6.121320344), (26.414213562, 9.414213562))
            ThreePointArc((26.414213562, 9.414213562), (25, 10), (23.585786438, 9.414213562))
        make_face()
    extrude(amount=-BOSS_EXTRUDE4_DEPTH)

    # Sketch8 → Cut-Extrude4 (cut, through all)
    with BuildSketch(Plane.XY.offset(1.6)):
        with Locations((-25, 10)):
            Circle(SKETCH8_R)
        with Locations(Location((25, 10, 0), (0, 0, 180))):
            Circle(SKETCH8_R)
        with Locations((0, -12)):
            Circle(SKETCH8_R)
    extrude(amount=-CUT_EXTRUDE4_DEPTH, mode=Mode.SUBTRACT)


solid = part.part
